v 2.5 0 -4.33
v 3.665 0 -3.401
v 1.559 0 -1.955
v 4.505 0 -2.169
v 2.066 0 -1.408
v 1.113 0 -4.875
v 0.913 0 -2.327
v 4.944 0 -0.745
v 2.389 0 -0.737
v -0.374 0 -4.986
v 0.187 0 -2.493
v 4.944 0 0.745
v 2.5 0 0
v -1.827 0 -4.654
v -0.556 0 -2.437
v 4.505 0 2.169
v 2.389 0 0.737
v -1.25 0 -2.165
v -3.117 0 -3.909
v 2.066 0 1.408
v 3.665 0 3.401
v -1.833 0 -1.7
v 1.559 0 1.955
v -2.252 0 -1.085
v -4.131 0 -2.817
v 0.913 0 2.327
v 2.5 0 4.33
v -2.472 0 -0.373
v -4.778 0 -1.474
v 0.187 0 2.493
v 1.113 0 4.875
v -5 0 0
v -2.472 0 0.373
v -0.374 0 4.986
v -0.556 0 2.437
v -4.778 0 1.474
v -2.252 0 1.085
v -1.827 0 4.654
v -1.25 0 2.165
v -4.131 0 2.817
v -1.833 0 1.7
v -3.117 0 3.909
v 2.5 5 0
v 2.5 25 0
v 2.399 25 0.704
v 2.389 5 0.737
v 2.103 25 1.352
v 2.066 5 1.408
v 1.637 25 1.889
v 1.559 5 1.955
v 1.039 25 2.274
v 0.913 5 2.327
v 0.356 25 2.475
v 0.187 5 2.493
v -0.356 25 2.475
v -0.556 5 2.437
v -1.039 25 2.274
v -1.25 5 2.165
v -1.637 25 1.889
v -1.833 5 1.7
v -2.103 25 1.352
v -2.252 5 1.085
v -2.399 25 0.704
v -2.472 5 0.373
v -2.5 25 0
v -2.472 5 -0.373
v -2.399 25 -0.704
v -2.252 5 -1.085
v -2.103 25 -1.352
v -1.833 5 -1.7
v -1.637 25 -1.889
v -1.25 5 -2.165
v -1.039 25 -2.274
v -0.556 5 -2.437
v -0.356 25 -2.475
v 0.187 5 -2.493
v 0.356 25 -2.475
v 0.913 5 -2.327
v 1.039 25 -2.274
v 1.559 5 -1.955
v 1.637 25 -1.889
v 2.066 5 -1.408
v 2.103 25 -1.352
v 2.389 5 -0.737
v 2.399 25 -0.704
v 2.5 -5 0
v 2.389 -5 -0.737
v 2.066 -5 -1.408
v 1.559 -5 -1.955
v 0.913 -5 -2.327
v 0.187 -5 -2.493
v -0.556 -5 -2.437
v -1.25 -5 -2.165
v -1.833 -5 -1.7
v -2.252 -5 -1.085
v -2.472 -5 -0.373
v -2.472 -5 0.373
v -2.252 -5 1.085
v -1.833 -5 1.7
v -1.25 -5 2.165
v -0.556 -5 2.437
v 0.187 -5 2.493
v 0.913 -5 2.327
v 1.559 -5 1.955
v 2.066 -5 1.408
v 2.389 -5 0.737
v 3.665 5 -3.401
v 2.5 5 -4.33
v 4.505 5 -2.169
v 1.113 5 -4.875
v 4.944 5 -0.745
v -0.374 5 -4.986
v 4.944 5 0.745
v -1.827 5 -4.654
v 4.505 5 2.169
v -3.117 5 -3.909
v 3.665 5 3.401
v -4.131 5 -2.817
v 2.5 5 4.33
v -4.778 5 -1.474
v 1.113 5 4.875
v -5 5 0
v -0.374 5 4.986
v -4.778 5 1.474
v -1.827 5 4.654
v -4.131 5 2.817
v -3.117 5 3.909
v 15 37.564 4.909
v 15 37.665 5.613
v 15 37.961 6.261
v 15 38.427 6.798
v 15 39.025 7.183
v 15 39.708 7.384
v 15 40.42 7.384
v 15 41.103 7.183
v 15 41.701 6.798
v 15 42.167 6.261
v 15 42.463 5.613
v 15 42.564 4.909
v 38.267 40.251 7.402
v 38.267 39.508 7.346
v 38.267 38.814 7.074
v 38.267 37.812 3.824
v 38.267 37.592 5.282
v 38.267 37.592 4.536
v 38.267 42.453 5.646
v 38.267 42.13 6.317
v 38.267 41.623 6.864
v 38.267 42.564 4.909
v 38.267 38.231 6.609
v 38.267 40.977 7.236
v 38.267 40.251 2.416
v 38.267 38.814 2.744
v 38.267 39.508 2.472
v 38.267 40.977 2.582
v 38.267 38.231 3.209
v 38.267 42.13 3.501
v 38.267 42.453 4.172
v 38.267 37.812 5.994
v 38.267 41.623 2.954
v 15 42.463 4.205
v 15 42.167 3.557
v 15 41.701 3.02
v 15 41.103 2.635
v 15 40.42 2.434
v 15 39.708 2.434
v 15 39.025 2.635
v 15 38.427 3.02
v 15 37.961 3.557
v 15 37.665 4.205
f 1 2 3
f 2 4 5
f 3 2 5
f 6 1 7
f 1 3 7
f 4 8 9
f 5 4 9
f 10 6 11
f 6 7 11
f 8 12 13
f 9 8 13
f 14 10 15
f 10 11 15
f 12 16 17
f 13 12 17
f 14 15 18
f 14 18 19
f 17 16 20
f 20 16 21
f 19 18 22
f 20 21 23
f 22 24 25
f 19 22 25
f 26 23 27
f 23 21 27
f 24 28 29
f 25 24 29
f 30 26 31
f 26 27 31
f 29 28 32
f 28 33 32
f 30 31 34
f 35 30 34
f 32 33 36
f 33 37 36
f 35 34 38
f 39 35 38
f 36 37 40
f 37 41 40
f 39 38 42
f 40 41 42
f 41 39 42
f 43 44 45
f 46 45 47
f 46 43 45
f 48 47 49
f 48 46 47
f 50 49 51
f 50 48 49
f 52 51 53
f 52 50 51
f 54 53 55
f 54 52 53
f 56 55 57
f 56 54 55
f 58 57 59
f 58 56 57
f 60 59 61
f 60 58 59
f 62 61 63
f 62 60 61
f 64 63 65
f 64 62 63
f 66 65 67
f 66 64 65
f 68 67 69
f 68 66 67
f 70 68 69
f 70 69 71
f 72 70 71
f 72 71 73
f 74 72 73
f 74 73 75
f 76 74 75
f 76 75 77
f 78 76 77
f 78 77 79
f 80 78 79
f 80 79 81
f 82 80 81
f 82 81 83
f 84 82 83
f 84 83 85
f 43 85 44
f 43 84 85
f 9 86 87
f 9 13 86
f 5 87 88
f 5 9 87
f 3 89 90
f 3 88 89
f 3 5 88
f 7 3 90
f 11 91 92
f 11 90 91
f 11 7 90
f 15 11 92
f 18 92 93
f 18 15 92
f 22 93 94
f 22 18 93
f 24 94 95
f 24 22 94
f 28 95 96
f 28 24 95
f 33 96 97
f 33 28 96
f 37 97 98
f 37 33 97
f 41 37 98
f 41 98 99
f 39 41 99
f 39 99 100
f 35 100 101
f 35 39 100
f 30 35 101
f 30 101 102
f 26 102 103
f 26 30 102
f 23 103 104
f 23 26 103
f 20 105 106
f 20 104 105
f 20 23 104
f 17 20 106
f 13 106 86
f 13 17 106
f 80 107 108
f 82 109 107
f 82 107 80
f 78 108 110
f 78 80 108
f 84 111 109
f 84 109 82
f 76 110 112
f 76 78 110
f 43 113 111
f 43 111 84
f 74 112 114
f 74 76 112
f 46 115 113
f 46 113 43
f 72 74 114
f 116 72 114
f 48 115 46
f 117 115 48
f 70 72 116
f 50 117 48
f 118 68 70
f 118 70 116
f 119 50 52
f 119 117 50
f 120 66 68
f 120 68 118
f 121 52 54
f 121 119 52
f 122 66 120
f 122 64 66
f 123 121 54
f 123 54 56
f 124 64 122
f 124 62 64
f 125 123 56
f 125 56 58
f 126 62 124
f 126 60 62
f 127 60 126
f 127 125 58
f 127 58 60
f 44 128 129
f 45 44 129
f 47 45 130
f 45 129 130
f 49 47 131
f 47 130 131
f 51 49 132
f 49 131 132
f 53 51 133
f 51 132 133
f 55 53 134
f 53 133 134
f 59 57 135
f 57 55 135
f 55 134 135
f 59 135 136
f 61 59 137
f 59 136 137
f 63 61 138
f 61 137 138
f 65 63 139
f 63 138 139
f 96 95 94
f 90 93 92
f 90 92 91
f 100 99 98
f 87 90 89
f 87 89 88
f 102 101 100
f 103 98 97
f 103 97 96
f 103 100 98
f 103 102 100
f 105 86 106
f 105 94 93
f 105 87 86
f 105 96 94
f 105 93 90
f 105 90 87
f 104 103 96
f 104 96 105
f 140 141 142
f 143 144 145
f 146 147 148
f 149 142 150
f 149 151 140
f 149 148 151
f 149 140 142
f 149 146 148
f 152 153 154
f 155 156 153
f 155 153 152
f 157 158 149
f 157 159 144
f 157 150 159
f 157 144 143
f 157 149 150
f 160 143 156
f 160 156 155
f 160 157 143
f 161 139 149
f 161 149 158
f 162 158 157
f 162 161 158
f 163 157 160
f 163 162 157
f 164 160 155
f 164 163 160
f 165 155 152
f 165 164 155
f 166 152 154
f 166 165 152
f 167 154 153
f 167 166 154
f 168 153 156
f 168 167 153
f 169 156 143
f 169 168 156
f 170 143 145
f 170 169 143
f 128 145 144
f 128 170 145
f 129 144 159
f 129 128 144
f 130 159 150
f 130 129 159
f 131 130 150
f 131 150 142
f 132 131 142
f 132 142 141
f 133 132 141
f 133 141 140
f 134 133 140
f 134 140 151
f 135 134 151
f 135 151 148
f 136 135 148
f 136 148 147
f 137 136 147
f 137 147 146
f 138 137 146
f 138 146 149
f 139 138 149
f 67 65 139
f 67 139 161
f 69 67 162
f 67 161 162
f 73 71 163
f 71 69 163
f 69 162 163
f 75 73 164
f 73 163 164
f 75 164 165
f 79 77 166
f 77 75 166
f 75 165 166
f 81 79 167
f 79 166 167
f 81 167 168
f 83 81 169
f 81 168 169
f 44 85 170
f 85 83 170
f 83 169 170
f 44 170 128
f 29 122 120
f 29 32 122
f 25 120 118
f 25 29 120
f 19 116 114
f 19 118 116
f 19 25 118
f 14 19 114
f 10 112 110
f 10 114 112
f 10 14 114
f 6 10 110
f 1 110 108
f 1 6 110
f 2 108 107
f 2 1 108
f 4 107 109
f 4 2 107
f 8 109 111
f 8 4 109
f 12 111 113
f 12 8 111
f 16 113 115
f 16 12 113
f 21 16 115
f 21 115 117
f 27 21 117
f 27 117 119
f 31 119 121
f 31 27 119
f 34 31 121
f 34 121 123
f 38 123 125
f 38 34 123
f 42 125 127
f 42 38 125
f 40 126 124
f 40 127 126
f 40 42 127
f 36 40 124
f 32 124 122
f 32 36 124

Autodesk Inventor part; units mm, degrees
ref_plane "XZ Plane" through (0, 0, 0) normal (0, 1, 0) x (-1, 0, 0)
ref_plane "XY Plane" through (0, 0, 0) normal (0, 0, 1) x (1, 0, 0)
sketch "Sketch1" plane through (0, 0, 0) normal (0, 1, 0) x (-1, 0, 0)
  circle A0 centre (0, 0) radius 5
  dimension "d0" = 10
extrude "Extrusion1" add sketch "Sketch1" along normal blind 5
sketch "Sketch2" plane through (0, 0, 0) normal (0, -1, 0) x (1, 0, 0)
  circle A0 centre (0, 0) radius 2.5
  dimension "d3" = 5
extrude "Extrusion2" add sketch "Sketch2" along normal blind 5
sketch "Sketch3" plane through (0, 5, 0) normal (0, 1, 0) x (1, 0, 0)
  circle A0 centre (0, 0) radius 2.5
  dimension "d6" = 5
extrude "Extrusion3" add sketch "Sketch3" along normal blind 20
ref_plane "Work Plane1" through (15, 0, 0) normal (1, 0, 0) x (0, 1, 0)
sketch "Sketch6" plane through (15, 0, 0) normal (1, 0, 0) x (0, 1, 0)
  line L0 (25, -2.5) -> (25, 2.5) projected
  line L1 (25, 0) -> (40.064, 0)
  line L2 (40.064, 0) -> (40.064, 4.909)
  circle A0 centre (40.064, 4.909) radius 2.5
  point P0 (0, 0)
  dimension "d28" = 15.064
  dimension "d29" = 4.909
  dimension "d30" = 5
extrude "Extrusion6" add sketch "Sketch6" along normal blind 25
loft "Loft3" add section 1 edges at (-2.5, 25, 0) section 2 edges at (15, 37.564, 4.909)
sketch "Sketch7" plane through (40, 40.064, 4.909) normal (1, 0, 0) x (0, 0, -1)
  circle A0 centre (0, 0) radius 2.5
  point P0 (4.909, -40.064)
  dimension "d37" = 5
extrude "Extrusion7" cut sketch "Sketch7" against normal blind 1.733
properties part number "gud gear stand proto 1 2"
